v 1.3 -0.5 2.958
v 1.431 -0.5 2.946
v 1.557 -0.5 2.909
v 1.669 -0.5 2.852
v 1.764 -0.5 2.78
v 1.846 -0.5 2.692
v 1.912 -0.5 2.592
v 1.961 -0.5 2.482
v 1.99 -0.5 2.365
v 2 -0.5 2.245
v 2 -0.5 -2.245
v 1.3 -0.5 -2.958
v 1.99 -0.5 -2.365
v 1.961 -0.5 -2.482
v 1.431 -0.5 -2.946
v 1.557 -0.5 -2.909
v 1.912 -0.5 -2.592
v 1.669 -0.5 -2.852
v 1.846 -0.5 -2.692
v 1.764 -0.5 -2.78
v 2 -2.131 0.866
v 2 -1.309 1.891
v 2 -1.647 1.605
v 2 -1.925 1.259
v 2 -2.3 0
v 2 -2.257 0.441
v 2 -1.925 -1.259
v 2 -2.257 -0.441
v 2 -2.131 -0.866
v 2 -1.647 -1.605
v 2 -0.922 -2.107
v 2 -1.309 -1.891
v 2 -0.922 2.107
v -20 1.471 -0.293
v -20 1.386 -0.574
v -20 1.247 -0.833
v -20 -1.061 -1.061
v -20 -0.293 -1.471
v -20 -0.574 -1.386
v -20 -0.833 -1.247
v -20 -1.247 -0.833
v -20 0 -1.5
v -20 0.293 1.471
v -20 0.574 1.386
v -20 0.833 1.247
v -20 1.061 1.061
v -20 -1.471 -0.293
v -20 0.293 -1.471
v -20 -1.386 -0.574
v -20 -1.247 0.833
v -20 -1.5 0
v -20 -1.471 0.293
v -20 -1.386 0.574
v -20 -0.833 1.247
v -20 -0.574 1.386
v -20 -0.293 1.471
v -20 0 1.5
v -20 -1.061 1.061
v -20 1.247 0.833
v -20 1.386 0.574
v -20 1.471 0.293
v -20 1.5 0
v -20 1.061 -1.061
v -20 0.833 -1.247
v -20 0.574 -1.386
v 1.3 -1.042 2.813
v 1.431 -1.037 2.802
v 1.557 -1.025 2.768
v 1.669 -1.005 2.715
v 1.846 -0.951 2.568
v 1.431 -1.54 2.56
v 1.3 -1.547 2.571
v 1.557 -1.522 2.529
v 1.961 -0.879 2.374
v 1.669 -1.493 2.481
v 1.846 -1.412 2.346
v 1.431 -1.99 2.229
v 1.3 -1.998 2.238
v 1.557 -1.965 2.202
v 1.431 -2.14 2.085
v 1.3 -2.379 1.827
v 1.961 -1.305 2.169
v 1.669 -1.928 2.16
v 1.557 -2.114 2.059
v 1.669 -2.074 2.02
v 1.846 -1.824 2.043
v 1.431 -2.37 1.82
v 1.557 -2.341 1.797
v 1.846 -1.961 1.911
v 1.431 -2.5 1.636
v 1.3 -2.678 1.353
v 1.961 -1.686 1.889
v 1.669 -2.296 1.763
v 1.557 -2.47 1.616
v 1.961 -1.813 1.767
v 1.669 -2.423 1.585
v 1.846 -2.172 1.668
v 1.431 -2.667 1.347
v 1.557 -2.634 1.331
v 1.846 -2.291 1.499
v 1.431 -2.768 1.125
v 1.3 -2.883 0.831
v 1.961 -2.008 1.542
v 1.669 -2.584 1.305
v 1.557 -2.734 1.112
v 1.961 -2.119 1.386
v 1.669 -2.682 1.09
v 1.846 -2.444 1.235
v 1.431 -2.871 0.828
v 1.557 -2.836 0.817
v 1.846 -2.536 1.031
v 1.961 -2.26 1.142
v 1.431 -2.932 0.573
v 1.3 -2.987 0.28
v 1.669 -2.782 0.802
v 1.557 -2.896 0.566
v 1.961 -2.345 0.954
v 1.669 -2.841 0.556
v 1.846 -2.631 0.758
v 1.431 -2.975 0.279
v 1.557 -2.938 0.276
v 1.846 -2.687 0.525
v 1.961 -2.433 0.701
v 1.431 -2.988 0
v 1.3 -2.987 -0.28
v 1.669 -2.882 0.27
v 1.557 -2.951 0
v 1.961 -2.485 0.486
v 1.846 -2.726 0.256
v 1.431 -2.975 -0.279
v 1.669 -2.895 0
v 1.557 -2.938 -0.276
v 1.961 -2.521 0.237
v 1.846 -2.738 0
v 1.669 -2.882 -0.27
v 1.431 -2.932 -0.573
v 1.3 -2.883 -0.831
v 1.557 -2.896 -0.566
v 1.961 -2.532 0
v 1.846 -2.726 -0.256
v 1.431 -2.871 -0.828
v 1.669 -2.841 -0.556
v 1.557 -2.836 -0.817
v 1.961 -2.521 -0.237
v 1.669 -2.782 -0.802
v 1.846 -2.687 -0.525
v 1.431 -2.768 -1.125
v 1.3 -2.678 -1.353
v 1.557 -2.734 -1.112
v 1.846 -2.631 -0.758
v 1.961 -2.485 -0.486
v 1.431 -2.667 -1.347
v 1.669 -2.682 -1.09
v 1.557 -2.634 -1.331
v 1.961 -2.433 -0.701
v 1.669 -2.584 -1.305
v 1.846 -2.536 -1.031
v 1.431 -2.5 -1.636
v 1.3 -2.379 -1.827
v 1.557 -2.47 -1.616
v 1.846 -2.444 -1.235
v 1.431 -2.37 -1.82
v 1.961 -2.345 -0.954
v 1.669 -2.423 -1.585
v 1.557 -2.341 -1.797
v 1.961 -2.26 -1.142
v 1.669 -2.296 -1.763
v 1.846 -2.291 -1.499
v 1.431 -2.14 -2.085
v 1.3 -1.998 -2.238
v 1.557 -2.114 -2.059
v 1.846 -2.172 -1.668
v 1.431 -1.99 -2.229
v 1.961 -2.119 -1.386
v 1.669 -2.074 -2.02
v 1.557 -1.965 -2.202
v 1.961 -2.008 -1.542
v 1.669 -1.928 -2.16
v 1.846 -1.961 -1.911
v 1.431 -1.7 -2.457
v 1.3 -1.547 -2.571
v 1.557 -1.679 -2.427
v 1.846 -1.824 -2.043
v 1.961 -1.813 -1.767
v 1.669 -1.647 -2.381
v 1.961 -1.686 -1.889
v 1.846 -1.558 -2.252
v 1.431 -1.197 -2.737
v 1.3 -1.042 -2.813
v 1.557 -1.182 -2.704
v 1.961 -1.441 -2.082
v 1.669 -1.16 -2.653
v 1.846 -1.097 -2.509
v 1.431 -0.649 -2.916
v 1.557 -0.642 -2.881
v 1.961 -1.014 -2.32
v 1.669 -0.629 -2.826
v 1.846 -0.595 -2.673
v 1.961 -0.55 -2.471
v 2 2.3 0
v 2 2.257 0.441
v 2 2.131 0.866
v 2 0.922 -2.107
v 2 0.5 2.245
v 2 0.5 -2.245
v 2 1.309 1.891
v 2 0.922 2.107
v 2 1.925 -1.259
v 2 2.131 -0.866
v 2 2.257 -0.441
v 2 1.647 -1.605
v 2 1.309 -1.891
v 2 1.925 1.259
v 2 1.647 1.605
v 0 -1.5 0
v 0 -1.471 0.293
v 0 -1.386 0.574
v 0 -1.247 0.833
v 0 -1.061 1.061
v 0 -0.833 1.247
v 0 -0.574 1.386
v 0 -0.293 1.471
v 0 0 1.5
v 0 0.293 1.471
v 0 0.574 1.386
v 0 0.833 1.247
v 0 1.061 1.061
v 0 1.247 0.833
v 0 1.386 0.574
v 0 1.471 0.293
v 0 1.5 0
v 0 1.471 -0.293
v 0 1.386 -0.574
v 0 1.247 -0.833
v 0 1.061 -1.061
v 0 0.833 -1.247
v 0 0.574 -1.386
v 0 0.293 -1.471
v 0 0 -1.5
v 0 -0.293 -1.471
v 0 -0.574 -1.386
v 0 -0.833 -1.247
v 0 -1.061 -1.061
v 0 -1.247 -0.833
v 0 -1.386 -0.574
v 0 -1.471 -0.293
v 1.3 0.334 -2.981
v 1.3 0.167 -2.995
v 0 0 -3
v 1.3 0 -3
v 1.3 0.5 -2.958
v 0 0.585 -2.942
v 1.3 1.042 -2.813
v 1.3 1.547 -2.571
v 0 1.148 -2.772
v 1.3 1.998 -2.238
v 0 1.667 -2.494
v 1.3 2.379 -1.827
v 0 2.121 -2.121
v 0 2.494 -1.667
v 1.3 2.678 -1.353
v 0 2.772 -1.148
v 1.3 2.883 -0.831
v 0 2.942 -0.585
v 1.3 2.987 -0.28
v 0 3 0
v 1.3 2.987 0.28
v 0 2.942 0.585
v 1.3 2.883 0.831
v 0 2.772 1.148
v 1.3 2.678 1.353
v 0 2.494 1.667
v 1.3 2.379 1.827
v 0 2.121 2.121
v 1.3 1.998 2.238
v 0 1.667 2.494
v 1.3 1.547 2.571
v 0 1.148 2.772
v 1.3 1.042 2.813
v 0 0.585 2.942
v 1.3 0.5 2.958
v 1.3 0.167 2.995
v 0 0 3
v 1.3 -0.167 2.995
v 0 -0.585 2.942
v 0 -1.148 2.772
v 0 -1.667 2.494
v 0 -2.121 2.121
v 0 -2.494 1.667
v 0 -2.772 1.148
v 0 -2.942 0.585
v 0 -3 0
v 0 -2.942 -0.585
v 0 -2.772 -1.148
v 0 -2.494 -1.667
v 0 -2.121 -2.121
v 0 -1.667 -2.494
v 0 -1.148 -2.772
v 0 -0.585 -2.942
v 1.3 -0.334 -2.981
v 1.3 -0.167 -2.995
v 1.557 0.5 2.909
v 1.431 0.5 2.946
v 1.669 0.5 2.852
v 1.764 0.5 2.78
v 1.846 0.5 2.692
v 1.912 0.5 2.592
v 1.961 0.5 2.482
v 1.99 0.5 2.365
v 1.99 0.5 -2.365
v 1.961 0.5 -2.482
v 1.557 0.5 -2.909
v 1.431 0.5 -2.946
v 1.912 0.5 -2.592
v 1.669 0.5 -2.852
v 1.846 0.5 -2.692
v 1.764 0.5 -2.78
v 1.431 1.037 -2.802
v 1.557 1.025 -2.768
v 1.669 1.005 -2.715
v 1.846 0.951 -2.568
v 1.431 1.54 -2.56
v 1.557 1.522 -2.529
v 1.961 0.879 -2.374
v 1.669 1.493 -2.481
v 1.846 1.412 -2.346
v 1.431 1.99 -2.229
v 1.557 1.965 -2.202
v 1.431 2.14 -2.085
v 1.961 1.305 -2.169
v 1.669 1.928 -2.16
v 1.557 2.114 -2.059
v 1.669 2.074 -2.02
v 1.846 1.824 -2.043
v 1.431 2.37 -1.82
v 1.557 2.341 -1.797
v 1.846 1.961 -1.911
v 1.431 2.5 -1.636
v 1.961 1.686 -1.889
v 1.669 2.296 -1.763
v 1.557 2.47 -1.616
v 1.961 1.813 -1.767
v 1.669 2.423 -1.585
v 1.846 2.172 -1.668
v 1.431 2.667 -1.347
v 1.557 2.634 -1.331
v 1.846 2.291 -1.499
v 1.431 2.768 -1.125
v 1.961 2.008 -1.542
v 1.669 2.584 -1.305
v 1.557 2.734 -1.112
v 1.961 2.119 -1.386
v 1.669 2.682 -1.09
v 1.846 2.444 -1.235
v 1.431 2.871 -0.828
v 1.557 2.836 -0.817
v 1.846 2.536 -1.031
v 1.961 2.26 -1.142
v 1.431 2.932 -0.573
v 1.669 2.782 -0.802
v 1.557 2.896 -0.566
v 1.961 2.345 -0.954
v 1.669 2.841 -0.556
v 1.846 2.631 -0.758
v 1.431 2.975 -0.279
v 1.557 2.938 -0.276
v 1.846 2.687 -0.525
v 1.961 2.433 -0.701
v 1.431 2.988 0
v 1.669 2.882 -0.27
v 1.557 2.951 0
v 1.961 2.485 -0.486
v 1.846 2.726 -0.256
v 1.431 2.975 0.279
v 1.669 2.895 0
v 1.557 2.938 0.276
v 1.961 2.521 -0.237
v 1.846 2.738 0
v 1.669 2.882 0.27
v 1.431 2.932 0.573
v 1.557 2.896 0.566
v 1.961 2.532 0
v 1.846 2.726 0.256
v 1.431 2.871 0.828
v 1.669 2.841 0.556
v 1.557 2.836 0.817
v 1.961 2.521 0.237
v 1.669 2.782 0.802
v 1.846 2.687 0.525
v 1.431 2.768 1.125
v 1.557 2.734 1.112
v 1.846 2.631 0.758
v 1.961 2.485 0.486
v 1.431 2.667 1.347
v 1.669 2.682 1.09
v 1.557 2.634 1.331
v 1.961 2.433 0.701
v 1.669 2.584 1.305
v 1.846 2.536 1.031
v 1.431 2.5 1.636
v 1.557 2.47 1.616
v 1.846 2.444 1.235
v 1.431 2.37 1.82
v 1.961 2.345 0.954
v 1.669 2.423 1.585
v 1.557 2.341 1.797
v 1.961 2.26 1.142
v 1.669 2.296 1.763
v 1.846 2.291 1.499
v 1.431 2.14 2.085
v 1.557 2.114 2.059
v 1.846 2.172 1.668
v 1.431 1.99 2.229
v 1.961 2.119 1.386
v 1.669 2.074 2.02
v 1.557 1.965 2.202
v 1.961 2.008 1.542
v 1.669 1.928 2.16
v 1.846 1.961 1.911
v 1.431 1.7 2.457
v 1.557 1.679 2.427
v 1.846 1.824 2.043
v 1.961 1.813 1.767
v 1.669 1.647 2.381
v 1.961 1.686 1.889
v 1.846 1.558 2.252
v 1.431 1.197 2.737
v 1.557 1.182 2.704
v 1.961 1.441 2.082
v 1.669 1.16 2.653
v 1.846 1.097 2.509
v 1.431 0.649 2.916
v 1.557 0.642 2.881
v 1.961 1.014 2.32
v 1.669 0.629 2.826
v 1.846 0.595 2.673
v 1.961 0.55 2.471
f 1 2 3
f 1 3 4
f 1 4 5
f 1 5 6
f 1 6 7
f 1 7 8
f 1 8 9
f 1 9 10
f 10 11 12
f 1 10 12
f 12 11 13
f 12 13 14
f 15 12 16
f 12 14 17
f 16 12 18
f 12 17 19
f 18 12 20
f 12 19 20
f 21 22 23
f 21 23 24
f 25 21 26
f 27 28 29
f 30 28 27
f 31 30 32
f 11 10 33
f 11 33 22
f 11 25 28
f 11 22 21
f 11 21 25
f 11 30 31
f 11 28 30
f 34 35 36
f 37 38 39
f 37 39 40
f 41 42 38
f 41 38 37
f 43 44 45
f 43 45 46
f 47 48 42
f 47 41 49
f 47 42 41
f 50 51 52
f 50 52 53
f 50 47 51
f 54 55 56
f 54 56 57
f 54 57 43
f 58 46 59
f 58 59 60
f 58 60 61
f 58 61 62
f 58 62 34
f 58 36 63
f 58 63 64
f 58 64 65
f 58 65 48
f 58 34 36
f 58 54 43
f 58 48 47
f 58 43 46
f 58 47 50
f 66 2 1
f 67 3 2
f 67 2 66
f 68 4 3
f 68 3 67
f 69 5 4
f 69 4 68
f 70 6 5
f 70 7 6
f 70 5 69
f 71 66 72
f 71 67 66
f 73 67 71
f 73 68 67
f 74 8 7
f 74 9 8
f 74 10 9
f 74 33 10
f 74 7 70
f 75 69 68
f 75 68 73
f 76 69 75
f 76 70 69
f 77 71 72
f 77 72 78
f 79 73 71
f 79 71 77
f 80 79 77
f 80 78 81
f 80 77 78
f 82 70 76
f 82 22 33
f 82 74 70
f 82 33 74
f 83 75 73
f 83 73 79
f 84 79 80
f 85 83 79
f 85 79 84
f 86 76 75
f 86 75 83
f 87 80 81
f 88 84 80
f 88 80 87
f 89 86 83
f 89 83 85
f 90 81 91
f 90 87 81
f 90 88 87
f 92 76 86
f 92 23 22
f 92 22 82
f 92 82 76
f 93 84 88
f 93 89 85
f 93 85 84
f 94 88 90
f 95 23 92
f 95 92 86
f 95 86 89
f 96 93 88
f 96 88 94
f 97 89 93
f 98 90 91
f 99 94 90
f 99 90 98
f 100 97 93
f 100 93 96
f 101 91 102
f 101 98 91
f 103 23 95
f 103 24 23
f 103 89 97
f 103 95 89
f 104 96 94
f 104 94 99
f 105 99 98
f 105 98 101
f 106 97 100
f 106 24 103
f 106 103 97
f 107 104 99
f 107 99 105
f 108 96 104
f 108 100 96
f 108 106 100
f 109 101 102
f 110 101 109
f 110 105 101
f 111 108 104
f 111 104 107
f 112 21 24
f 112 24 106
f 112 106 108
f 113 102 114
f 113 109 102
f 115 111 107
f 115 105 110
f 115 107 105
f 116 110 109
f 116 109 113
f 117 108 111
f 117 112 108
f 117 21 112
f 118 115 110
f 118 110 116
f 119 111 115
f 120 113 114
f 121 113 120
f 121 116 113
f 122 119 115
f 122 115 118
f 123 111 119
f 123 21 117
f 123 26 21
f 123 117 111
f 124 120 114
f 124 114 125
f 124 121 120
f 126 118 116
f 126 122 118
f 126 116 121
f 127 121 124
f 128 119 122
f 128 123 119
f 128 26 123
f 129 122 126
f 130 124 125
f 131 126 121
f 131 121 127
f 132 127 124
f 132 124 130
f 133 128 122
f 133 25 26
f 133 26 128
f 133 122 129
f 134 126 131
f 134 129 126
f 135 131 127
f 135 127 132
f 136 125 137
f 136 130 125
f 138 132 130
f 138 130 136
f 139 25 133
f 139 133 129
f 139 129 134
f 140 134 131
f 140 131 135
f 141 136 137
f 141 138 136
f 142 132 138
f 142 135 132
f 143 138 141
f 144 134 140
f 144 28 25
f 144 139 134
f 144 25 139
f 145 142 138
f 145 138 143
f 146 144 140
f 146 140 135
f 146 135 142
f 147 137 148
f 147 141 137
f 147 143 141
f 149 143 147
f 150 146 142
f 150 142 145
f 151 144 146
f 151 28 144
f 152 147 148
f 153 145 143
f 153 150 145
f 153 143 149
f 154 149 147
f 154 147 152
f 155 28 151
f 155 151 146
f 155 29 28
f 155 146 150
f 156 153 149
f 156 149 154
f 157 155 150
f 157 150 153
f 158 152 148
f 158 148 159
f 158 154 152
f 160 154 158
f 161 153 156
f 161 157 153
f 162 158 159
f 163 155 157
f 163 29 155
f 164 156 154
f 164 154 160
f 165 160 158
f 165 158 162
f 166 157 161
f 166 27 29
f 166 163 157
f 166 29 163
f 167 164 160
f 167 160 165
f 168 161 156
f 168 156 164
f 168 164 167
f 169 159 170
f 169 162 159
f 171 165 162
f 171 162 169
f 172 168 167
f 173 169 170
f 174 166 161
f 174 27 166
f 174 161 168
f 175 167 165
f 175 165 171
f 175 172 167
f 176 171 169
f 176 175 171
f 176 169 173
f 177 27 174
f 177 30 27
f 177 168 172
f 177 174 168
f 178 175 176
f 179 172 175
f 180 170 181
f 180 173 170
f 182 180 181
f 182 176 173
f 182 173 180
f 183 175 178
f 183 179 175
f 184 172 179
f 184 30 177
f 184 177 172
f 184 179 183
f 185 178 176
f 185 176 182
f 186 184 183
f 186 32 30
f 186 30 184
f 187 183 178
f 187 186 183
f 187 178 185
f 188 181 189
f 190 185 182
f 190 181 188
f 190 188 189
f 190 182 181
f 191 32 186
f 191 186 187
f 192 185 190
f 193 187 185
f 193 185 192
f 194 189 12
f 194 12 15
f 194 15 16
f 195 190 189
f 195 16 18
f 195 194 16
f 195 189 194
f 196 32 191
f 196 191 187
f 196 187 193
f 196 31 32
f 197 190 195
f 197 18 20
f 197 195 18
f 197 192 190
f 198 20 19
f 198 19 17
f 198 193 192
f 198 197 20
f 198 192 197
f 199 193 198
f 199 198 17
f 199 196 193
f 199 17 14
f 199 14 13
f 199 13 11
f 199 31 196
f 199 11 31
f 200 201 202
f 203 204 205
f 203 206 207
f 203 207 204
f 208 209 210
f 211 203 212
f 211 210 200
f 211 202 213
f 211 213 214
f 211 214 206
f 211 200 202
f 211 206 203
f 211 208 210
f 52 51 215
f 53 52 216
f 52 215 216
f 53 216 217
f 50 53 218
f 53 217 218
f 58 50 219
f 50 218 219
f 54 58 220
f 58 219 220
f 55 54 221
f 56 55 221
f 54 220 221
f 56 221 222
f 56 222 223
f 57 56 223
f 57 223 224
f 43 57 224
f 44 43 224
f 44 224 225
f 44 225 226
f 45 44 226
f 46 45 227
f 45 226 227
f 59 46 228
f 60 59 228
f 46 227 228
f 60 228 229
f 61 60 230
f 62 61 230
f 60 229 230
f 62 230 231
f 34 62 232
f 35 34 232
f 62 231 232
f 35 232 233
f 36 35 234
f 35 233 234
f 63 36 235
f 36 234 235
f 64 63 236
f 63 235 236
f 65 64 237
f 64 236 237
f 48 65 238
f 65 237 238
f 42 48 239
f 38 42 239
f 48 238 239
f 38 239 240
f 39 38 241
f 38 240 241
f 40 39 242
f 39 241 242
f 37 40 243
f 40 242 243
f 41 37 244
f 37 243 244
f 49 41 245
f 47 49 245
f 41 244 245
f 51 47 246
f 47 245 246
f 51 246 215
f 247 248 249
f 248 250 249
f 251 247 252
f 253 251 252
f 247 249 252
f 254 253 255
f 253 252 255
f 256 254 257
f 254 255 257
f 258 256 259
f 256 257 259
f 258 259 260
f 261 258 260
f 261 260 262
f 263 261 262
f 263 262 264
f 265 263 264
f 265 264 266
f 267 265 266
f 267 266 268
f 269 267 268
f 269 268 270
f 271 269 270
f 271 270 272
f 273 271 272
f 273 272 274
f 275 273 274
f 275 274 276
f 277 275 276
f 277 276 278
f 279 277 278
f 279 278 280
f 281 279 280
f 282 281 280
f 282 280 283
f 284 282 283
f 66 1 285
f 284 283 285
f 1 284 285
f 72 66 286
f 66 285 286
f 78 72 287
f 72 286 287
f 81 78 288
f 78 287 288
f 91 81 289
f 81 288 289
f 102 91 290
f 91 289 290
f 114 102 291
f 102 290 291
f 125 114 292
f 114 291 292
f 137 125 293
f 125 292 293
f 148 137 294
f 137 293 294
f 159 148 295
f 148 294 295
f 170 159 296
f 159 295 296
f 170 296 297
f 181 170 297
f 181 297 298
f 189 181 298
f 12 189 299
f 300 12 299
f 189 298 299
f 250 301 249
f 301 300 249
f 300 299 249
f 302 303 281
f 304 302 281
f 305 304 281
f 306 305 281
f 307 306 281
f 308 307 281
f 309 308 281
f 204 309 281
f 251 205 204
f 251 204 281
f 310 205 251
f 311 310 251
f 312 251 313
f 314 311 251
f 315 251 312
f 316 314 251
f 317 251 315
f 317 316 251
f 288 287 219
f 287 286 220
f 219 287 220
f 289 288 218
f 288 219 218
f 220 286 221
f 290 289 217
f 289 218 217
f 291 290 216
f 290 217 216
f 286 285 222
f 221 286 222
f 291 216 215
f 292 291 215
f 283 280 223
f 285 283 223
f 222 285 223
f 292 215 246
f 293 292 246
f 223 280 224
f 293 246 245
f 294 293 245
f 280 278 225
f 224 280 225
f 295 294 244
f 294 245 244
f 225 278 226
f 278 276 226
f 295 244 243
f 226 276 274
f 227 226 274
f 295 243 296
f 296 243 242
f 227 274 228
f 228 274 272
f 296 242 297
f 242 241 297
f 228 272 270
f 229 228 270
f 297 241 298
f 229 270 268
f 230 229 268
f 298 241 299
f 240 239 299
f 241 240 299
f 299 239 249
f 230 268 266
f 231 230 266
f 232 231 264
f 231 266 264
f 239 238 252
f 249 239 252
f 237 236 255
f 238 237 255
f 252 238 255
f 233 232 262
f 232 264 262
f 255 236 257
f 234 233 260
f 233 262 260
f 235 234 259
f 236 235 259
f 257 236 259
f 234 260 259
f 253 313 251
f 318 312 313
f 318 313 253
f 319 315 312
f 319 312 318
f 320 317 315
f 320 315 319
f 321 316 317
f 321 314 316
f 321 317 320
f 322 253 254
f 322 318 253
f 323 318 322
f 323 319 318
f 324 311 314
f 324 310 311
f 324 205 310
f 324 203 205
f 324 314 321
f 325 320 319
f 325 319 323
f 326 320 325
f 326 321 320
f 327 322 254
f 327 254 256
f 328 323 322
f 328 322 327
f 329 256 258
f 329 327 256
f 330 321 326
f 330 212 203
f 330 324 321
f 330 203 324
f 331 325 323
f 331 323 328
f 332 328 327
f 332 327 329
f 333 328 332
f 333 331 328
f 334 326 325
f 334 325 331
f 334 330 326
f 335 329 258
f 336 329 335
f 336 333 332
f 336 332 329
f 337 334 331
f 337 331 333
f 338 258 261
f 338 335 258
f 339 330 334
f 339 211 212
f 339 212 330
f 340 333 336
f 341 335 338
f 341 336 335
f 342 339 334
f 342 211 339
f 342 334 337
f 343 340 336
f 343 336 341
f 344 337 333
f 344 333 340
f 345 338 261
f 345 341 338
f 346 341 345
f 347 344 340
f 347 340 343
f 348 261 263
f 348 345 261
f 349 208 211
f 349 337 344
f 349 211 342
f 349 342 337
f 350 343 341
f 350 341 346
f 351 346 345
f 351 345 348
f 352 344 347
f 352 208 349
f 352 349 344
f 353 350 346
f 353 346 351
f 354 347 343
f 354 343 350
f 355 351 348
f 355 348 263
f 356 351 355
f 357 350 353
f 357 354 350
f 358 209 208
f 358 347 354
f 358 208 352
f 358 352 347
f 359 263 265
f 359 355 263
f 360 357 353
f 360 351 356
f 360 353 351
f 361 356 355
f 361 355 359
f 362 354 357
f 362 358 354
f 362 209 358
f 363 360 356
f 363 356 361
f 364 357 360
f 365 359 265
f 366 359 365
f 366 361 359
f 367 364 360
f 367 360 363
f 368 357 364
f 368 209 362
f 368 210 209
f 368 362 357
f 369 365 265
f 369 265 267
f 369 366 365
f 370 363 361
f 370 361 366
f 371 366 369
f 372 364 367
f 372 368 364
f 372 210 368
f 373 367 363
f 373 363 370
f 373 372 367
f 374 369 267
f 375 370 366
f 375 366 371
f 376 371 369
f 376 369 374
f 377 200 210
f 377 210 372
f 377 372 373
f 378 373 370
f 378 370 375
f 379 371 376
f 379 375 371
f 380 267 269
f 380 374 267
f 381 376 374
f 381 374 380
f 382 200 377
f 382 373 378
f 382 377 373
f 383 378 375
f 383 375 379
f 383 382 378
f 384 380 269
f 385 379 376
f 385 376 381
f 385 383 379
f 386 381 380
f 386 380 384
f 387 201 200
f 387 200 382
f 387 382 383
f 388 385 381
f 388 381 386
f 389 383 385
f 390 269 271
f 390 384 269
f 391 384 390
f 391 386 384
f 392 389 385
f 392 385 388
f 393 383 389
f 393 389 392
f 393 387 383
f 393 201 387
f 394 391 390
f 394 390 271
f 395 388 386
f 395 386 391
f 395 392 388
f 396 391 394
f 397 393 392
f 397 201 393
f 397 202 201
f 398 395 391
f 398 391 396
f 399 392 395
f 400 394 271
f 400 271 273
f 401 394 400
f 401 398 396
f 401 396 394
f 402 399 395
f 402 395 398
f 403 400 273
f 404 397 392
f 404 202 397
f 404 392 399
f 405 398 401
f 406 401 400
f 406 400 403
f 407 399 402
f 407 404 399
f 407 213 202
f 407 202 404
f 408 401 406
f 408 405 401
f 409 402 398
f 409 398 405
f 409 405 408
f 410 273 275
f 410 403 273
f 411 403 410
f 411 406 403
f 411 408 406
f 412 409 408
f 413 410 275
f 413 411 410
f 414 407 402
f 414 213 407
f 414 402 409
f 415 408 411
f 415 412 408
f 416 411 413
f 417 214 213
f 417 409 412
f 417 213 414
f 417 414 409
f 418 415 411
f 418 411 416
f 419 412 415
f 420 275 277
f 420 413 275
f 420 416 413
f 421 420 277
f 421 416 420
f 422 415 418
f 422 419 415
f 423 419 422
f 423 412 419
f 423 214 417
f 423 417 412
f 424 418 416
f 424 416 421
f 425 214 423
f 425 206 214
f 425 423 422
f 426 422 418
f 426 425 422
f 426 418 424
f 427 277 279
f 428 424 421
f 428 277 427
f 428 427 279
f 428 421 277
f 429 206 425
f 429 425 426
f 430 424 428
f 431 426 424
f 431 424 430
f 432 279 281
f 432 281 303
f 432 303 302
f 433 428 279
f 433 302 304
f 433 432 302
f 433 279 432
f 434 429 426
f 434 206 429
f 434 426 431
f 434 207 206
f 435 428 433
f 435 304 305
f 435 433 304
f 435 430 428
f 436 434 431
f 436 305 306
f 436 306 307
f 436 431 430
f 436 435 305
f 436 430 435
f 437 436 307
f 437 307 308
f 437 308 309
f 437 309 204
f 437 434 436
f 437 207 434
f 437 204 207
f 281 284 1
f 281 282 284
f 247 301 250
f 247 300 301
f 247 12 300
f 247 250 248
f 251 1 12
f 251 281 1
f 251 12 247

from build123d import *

# Parameters (mm, degrees)
SCHIZZO1_W                   = 20
SCHIZZO1_H                   = 1.5
SCHIZZO3_R                   = 3
ESTRUSIONE_ESTRUSIONE1_DEPTH = 2
SCHIZZO4_W                   = 7
SCHIZZO4_H                   = 1
TAGLIO_ESTRUSIONE1_DEPTH     = 0.7
RACCORDO1_R                  = 0.7


with BuildPart() as part:
    # Schizzo1 → Rivoluzione-Sottile1 (revolve)
    with BuildSketch(Plane.XY):
        with Locations((-10, -0.75)):
            Rectangle(SCHIZZO1_W, SCHIZZO1_H)
    revolve(axis=Axis((0, 0, 0), (-1, 0, 0)))

    # Schizzo3 → Estrusione-Estrusione1 (add)
    with BuildSketch(Plane(origin=(0, 0, 0), x_dir=(0, 0, -1), z_dir=(1, 0, 0))):
        Circle(SCHIZZO3_R)
    extrude(amount=ESTRUSIONE_ESTRUSIONE1_DEPTH)

    # Schizzo4 → Taglio-Estrusione1 (cut)
    with BuildSketch(Plane(origin=(2, 0, 0), x_dir=(0, 0, -1), z_dir=(1, 0, 0))):
        Rectangle(SCHIZZO4_W, SCHIZZO4_H)
    extrude(amount=-TAGLIO_ESTRUSIONE1_DEPTH, mode=Mode.SUBTRACT)

    # Raccordo1
    raccordo1_edges = [part.edges().sort_by_distance(p)[0] for p in [
        (2, -3, 0),
        (2, 3, 0),
    ]]
    fillet(raccordo1_edges, radius=RACCORDO1_R)


solid = part.part
